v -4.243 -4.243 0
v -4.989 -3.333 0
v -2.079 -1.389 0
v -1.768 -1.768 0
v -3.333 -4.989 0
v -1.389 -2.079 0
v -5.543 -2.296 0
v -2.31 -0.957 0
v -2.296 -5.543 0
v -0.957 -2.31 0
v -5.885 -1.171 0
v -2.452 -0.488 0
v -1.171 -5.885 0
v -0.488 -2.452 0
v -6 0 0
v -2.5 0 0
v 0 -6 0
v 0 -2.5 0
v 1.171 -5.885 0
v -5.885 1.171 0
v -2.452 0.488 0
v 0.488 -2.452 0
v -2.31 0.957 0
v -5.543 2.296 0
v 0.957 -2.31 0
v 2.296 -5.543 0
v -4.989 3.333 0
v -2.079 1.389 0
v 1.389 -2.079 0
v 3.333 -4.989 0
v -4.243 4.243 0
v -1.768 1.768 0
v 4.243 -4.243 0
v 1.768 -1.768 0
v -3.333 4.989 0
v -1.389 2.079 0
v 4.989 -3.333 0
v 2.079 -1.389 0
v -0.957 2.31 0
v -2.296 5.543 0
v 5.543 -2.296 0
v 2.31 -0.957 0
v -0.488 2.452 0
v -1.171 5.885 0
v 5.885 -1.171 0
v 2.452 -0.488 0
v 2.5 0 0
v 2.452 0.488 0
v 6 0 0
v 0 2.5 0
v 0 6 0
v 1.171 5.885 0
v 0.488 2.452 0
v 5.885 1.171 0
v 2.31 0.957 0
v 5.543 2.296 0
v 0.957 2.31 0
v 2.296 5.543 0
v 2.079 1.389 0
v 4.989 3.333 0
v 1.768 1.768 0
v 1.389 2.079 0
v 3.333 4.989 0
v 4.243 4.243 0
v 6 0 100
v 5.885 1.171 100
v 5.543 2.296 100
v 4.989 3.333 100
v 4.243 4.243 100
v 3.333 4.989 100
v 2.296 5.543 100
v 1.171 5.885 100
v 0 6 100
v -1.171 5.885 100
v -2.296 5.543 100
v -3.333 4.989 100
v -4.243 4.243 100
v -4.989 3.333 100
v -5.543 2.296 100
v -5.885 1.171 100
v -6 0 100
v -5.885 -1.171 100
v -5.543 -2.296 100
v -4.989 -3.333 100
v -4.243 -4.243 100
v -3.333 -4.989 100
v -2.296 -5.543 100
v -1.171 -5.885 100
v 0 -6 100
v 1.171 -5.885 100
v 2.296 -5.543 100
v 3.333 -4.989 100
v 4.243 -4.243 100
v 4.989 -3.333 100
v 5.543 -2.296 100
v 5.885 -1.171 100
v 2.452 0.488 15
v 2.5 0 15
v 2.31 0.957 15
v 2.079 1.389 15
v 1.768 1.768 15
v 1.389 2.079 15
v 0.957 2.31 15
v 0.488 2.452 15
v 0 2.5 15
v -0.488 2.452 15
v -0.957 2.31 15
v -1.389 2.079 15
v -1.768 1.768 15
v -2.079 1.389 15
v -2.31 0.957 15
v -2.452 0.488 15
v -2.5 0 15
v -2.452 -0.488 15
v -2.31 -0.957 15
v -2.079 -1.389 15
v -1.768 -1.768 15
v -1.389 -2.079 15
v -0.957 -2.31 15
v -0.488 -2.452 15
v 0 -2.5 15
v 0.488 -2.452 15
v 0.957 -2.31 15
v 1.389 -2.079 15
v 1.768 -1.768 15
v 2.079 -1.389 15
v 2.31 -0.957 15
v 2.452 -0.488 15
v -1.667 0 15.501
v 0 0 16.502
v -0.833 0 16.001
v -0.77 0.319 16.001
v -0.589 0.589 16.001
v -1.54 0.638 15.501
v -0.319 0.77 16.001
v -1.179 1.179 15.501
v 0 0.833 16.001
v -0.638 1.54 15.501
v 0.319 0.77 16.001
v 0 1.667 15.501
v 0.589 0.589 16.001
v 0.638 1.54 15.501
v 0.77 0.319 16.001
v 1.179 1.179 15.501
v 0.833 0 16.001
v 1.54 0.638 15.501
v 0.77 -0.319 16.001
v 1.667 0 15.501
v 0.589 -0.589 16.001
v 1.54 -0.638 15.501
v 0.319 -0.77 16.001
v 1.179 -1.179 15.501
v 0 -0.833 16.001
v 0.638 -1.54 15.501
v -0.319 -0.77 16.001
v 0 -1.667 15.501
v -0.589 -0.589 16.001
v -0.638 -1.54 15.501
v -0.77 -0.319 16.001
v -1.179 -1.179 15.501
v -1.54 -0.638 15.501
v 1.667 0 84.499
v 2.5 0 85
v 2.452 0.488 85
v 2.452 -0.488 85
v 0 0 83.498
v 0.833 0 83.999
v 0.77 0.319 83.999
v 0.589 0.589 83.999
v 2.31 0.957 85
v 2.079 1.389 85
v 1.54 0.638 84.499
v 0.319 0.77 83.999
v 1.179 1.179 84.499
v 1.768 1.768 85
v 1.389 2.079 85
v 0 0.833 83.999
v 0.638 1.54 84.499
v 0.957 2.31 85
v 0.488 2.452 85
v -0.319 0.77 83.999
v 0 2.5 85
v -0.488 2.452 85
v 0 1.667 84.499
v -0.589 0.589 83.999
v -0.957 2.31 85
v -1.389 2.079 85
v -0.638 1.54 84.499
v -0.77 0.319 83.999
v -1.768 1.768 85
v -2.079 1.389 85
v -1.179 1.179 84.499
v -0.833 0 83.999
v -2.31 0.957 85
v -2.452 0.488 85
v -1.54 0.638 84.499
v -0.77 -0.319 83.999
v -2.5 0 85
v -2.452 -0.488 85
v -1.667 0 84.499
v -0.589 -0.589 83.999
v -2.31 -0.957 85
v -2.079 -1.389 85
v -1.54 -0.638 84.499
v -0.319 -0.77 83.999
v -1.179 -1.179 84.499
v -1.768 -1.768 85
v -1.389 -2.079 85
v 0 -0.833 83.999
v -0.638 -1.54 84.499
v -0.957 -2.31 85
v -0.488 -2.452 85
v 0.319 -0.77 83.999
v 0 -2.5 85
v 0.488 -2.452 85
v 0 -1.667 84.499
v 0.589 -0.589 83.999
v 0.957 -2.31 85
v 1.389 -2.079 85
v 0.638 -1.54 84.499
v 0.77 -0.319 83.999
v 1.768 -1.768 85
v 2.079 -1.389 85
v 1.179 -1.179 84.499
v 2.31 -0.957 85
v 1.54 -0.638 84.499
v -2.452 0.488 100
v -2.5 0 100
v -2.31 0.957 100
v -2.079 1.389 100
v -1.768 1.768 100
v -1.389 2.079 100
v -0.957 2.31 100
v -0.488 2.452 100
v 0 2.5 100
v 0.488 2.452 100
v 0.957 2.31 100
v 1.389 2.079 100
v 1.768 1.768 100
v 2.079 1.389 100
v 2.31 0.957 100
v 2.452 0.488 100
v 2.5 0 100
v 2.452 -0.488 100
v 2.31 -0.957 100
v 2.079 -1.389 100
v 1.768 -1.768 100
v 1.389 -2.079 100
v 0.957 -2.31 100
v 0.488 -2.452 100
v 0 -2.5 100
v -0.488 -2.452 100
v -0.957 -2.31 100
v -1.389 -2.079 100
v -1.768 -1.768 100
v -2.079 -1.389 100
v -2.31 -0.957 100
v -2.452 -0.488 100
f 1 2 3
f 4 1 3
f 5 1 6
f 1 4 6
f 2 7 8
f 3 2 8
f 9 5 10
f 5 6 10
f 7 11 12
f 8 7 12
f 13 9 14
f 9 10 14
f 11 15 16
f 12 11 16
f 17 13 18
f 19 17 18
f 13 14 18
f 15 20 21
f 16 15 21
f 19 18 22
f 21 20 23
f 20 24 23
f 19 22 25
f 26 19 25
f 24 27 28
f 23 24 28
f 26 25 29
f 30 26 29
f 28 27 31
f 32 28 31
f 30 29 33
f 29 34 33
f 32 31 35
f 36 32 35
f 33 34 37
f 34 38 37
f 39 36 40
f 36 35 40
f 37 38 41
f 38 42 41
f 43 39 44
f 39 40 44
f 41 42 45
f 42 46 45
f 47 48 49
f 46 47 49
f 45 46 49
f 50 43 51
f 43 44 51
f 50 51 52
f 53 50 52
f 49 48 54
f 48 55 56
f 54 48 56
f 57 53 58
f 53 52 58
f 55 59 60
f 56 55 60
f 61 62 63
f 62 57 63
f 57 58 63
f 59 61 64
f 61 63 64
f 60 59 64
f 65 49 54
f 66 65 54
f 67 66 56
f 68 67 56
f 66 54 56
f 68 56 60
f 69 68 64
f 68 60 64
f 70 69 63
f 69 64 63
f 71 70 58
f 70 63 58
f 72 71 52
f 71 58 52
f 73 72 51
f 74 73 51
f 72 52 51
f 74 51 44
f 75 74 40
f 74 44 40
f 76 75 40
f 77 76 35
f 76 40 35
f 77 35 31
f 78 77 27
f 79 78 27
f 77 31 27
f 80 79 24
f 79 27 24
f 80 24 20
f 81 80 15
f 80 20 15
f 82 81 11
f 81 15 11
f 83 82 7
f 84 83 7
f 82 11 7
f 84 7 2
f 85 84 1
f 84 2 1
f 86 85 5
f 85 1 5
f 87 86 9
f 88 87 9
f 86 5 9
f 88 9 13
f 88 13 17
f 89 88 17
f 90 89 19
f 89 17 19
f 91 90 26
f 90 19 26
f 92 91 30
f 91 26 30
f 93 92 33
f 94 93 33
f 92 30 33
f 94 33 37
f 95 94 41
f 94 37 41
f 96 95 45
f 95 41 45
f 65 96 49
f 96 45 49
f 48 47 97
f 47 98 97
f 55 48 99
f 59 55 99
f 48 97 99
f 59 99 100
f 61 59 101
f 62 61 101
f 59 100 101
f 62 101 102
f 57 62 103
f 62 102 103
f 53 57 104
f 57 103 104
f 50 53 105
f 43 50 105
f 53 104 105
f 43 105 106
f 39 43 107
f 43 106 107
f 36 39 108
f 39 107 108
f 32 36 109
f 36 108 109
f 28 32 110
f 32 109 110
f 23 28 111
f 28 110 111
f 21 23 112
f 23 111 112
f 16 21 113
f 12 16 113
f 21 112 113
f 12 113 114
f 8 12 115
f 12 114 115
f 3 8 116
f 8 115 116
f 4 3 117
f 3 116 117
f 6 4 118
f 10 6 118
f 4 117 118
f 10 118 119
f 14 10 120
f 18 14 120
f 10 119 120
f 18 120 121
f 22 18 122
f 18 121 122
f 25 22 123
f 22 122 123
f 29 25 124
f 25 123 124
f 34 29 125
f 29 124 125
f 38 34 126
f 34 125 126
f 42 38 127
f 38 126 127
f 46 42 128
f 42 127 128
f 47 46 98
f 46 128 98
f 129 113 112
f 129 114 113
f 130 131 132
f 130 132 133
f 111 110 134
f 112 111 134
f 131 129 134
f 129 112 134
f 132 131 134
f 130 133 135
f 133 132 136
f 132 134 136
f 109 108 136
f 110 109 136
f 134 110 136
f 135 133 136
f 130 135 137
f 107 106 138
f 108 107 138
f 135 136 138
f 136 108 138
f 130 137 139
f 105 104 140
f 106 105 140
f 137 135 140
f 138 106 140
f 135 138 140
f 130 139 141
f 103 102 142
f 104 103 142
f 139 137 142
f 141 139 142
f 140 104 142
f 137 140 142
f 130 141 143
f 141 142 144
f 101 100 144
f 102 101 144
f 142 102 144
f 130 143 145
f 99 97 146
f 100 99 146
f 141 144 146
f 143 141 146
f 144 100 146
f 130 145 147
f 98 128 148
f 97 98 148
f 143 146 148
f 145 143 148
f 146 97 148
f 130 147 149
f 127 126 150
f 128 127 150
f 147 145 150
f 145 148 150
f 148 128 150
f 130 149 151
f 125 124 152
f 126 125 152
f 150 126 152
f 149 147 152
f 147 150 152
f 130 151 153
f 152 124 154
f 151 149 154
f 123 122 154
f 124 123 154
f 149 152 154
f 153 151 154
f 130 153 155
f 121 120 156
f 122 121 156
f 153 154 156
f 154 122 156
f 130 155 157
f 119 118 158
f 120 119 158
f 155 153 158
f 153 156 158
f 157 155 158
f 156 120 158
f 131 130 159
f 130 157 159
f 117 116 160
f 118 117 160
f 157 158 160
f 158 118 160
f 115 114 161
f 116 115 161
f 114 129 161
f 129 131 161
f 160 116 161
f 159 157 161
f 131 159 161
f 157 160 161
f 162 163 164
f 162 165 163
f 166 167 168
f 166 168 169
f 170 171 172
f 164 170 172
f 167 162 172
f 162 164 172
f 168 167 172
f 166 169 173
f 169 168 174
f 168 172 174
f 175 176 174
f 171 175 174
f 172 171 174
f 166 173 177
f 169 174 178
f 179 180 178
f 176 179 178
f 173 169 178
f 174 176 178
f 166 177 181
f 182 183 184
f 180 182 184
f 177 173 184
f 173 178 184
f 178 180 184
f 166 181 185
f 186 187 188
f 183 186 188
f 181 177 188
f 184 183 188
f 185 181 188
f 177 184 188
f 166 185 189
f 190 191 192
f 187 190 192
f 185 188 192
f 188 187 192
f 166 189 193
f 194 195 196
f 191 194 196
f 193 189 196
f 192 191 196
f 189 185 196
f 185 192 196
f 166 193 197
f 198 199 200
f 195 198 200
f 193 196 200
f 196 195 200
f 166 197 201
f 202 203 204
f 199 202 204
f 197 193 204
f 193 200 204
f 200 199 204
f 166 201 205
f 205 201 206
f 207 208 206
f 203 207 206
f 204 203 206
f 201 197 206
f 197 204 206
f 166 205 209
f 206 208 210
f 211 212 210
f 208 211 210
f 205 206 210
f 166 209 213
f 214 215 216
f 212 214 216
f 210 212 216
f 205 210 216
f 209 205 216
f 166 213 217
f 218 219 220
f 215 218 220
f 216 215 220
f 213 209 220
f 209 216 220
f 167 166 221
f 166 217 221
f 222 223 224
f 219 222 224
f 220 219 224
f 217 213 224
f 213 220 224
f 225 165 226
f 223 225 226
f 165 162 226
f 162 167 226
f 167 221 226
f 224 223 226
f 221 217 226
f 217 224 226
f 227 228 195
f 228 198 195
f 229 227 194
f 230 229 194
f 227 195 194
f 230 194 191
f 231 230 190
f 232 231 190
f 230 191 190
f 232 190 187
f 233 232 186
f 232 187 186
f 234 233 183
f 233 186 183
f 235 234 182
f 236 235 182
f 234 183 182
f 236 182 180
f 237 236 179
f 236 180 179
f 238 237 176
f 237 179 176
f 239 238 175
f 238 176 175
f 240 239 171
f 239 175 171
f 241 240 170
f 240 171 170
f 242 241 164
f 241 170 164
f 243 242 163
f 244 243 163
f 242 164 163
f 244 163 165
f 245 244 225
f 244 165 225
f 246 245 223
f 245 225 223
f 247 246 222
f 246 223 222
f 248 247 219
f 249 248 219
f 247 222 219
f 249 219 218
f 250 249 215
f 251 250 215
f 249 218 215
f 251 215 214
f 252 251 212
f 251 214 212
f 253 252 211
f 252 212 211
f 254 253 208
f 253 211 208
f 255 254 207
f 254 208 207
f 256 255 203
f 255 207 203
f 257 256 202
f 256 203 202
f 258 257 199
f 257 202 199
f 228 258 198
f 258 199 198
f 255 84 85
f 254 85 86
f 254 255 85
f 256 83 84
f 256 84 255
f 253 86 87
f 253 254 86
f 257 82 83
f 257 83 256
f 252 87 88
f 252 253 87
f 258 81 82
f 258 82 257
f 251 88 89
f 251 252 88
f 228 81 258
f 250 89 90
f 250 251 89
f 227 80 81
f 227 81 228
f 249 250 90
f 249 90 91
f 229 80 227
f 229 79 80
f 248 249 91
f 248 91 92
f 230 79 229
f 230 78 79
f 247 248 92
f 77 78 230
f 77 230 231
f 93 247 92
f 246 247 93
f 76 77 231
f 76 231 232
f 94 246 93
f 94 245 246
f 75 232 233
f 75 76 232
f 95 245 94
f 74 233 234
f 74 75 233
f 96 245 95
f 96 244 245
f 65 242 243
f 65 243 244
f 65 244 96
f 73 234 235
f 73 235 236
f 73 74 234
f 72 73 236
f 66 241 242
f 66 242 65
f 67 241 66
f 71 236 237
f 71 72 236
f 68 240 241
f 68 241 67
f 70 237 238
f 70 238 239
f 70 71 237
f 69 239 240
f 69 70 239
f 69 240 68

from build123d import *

# Parameters (mm, degrees)
SKETCH_1_R             = 6
EXTRUDE_1_DEPTH        = 100
HOLE_WIZARD_M6_1_D     = 5
HOLE_WIZARD_M6_1_DEPTH = 15
HOLE_WIZARD_M6_1_TIP   = 1.502151548
HOLE_WIZARD_M6_2_D     = 5
HOLE_WIZARD_M6_2_DEPTH = 15
HOLE_WIZARD_M6_2_TIP   = 1.502151548


with BuildPart() as part:
    # 草图1 → 凸台-拉伸1 (new body)
    with BuildSketch(Plane.XY):
        Circle(SKETCH_1_R)
    extrude(amount=EXTRUDE_1_DEPTH)

    # M6 螺纹孔1
    with Locations(Plane(origin=(0, 0, 0), x_dir=(-1, 0, 0), z_dir=(0, 0, -1))):
        with Locations((0, 0)):
            Hole(HOLE_WIZARD_M6_1_D / 2, depth=HOLE_WIZARD_M6_1_DEPTH)
            with Locations((0, 0, -(HOLE_WIZARD_M6_1_DEPTH + HOLE_WIZARD_M6_1_TIP / 2))):  # 118° drill point
                Cone(0, HOLE_WIZARD_M6_1_D / 2, HOLE_WIZARD_M6_1_TIP, mode=Mode.SUBTRACT)

    # M6 螺纹孔2
    with Locations(Plane.XY.offset(100)):
        with Locations((0, 0)):
            Hole(HOLE_WIZARD_M6_2_D / 2, depth=HOLE_WIZARD_M6_2_DEPTH)
            with Locations((0, 0, -(HOLE_WIZARD_M6_2_DEPTH + HOLE_WIZARD_M6_2_TIP / 2))):  # 118° drill point
                Cone(0, HOLE_WIZARD_M6_2_D / 2, HOLE_WIZARD_M6_2_TIP, mode=Mode.SUBTRACT)


solid = part.part
